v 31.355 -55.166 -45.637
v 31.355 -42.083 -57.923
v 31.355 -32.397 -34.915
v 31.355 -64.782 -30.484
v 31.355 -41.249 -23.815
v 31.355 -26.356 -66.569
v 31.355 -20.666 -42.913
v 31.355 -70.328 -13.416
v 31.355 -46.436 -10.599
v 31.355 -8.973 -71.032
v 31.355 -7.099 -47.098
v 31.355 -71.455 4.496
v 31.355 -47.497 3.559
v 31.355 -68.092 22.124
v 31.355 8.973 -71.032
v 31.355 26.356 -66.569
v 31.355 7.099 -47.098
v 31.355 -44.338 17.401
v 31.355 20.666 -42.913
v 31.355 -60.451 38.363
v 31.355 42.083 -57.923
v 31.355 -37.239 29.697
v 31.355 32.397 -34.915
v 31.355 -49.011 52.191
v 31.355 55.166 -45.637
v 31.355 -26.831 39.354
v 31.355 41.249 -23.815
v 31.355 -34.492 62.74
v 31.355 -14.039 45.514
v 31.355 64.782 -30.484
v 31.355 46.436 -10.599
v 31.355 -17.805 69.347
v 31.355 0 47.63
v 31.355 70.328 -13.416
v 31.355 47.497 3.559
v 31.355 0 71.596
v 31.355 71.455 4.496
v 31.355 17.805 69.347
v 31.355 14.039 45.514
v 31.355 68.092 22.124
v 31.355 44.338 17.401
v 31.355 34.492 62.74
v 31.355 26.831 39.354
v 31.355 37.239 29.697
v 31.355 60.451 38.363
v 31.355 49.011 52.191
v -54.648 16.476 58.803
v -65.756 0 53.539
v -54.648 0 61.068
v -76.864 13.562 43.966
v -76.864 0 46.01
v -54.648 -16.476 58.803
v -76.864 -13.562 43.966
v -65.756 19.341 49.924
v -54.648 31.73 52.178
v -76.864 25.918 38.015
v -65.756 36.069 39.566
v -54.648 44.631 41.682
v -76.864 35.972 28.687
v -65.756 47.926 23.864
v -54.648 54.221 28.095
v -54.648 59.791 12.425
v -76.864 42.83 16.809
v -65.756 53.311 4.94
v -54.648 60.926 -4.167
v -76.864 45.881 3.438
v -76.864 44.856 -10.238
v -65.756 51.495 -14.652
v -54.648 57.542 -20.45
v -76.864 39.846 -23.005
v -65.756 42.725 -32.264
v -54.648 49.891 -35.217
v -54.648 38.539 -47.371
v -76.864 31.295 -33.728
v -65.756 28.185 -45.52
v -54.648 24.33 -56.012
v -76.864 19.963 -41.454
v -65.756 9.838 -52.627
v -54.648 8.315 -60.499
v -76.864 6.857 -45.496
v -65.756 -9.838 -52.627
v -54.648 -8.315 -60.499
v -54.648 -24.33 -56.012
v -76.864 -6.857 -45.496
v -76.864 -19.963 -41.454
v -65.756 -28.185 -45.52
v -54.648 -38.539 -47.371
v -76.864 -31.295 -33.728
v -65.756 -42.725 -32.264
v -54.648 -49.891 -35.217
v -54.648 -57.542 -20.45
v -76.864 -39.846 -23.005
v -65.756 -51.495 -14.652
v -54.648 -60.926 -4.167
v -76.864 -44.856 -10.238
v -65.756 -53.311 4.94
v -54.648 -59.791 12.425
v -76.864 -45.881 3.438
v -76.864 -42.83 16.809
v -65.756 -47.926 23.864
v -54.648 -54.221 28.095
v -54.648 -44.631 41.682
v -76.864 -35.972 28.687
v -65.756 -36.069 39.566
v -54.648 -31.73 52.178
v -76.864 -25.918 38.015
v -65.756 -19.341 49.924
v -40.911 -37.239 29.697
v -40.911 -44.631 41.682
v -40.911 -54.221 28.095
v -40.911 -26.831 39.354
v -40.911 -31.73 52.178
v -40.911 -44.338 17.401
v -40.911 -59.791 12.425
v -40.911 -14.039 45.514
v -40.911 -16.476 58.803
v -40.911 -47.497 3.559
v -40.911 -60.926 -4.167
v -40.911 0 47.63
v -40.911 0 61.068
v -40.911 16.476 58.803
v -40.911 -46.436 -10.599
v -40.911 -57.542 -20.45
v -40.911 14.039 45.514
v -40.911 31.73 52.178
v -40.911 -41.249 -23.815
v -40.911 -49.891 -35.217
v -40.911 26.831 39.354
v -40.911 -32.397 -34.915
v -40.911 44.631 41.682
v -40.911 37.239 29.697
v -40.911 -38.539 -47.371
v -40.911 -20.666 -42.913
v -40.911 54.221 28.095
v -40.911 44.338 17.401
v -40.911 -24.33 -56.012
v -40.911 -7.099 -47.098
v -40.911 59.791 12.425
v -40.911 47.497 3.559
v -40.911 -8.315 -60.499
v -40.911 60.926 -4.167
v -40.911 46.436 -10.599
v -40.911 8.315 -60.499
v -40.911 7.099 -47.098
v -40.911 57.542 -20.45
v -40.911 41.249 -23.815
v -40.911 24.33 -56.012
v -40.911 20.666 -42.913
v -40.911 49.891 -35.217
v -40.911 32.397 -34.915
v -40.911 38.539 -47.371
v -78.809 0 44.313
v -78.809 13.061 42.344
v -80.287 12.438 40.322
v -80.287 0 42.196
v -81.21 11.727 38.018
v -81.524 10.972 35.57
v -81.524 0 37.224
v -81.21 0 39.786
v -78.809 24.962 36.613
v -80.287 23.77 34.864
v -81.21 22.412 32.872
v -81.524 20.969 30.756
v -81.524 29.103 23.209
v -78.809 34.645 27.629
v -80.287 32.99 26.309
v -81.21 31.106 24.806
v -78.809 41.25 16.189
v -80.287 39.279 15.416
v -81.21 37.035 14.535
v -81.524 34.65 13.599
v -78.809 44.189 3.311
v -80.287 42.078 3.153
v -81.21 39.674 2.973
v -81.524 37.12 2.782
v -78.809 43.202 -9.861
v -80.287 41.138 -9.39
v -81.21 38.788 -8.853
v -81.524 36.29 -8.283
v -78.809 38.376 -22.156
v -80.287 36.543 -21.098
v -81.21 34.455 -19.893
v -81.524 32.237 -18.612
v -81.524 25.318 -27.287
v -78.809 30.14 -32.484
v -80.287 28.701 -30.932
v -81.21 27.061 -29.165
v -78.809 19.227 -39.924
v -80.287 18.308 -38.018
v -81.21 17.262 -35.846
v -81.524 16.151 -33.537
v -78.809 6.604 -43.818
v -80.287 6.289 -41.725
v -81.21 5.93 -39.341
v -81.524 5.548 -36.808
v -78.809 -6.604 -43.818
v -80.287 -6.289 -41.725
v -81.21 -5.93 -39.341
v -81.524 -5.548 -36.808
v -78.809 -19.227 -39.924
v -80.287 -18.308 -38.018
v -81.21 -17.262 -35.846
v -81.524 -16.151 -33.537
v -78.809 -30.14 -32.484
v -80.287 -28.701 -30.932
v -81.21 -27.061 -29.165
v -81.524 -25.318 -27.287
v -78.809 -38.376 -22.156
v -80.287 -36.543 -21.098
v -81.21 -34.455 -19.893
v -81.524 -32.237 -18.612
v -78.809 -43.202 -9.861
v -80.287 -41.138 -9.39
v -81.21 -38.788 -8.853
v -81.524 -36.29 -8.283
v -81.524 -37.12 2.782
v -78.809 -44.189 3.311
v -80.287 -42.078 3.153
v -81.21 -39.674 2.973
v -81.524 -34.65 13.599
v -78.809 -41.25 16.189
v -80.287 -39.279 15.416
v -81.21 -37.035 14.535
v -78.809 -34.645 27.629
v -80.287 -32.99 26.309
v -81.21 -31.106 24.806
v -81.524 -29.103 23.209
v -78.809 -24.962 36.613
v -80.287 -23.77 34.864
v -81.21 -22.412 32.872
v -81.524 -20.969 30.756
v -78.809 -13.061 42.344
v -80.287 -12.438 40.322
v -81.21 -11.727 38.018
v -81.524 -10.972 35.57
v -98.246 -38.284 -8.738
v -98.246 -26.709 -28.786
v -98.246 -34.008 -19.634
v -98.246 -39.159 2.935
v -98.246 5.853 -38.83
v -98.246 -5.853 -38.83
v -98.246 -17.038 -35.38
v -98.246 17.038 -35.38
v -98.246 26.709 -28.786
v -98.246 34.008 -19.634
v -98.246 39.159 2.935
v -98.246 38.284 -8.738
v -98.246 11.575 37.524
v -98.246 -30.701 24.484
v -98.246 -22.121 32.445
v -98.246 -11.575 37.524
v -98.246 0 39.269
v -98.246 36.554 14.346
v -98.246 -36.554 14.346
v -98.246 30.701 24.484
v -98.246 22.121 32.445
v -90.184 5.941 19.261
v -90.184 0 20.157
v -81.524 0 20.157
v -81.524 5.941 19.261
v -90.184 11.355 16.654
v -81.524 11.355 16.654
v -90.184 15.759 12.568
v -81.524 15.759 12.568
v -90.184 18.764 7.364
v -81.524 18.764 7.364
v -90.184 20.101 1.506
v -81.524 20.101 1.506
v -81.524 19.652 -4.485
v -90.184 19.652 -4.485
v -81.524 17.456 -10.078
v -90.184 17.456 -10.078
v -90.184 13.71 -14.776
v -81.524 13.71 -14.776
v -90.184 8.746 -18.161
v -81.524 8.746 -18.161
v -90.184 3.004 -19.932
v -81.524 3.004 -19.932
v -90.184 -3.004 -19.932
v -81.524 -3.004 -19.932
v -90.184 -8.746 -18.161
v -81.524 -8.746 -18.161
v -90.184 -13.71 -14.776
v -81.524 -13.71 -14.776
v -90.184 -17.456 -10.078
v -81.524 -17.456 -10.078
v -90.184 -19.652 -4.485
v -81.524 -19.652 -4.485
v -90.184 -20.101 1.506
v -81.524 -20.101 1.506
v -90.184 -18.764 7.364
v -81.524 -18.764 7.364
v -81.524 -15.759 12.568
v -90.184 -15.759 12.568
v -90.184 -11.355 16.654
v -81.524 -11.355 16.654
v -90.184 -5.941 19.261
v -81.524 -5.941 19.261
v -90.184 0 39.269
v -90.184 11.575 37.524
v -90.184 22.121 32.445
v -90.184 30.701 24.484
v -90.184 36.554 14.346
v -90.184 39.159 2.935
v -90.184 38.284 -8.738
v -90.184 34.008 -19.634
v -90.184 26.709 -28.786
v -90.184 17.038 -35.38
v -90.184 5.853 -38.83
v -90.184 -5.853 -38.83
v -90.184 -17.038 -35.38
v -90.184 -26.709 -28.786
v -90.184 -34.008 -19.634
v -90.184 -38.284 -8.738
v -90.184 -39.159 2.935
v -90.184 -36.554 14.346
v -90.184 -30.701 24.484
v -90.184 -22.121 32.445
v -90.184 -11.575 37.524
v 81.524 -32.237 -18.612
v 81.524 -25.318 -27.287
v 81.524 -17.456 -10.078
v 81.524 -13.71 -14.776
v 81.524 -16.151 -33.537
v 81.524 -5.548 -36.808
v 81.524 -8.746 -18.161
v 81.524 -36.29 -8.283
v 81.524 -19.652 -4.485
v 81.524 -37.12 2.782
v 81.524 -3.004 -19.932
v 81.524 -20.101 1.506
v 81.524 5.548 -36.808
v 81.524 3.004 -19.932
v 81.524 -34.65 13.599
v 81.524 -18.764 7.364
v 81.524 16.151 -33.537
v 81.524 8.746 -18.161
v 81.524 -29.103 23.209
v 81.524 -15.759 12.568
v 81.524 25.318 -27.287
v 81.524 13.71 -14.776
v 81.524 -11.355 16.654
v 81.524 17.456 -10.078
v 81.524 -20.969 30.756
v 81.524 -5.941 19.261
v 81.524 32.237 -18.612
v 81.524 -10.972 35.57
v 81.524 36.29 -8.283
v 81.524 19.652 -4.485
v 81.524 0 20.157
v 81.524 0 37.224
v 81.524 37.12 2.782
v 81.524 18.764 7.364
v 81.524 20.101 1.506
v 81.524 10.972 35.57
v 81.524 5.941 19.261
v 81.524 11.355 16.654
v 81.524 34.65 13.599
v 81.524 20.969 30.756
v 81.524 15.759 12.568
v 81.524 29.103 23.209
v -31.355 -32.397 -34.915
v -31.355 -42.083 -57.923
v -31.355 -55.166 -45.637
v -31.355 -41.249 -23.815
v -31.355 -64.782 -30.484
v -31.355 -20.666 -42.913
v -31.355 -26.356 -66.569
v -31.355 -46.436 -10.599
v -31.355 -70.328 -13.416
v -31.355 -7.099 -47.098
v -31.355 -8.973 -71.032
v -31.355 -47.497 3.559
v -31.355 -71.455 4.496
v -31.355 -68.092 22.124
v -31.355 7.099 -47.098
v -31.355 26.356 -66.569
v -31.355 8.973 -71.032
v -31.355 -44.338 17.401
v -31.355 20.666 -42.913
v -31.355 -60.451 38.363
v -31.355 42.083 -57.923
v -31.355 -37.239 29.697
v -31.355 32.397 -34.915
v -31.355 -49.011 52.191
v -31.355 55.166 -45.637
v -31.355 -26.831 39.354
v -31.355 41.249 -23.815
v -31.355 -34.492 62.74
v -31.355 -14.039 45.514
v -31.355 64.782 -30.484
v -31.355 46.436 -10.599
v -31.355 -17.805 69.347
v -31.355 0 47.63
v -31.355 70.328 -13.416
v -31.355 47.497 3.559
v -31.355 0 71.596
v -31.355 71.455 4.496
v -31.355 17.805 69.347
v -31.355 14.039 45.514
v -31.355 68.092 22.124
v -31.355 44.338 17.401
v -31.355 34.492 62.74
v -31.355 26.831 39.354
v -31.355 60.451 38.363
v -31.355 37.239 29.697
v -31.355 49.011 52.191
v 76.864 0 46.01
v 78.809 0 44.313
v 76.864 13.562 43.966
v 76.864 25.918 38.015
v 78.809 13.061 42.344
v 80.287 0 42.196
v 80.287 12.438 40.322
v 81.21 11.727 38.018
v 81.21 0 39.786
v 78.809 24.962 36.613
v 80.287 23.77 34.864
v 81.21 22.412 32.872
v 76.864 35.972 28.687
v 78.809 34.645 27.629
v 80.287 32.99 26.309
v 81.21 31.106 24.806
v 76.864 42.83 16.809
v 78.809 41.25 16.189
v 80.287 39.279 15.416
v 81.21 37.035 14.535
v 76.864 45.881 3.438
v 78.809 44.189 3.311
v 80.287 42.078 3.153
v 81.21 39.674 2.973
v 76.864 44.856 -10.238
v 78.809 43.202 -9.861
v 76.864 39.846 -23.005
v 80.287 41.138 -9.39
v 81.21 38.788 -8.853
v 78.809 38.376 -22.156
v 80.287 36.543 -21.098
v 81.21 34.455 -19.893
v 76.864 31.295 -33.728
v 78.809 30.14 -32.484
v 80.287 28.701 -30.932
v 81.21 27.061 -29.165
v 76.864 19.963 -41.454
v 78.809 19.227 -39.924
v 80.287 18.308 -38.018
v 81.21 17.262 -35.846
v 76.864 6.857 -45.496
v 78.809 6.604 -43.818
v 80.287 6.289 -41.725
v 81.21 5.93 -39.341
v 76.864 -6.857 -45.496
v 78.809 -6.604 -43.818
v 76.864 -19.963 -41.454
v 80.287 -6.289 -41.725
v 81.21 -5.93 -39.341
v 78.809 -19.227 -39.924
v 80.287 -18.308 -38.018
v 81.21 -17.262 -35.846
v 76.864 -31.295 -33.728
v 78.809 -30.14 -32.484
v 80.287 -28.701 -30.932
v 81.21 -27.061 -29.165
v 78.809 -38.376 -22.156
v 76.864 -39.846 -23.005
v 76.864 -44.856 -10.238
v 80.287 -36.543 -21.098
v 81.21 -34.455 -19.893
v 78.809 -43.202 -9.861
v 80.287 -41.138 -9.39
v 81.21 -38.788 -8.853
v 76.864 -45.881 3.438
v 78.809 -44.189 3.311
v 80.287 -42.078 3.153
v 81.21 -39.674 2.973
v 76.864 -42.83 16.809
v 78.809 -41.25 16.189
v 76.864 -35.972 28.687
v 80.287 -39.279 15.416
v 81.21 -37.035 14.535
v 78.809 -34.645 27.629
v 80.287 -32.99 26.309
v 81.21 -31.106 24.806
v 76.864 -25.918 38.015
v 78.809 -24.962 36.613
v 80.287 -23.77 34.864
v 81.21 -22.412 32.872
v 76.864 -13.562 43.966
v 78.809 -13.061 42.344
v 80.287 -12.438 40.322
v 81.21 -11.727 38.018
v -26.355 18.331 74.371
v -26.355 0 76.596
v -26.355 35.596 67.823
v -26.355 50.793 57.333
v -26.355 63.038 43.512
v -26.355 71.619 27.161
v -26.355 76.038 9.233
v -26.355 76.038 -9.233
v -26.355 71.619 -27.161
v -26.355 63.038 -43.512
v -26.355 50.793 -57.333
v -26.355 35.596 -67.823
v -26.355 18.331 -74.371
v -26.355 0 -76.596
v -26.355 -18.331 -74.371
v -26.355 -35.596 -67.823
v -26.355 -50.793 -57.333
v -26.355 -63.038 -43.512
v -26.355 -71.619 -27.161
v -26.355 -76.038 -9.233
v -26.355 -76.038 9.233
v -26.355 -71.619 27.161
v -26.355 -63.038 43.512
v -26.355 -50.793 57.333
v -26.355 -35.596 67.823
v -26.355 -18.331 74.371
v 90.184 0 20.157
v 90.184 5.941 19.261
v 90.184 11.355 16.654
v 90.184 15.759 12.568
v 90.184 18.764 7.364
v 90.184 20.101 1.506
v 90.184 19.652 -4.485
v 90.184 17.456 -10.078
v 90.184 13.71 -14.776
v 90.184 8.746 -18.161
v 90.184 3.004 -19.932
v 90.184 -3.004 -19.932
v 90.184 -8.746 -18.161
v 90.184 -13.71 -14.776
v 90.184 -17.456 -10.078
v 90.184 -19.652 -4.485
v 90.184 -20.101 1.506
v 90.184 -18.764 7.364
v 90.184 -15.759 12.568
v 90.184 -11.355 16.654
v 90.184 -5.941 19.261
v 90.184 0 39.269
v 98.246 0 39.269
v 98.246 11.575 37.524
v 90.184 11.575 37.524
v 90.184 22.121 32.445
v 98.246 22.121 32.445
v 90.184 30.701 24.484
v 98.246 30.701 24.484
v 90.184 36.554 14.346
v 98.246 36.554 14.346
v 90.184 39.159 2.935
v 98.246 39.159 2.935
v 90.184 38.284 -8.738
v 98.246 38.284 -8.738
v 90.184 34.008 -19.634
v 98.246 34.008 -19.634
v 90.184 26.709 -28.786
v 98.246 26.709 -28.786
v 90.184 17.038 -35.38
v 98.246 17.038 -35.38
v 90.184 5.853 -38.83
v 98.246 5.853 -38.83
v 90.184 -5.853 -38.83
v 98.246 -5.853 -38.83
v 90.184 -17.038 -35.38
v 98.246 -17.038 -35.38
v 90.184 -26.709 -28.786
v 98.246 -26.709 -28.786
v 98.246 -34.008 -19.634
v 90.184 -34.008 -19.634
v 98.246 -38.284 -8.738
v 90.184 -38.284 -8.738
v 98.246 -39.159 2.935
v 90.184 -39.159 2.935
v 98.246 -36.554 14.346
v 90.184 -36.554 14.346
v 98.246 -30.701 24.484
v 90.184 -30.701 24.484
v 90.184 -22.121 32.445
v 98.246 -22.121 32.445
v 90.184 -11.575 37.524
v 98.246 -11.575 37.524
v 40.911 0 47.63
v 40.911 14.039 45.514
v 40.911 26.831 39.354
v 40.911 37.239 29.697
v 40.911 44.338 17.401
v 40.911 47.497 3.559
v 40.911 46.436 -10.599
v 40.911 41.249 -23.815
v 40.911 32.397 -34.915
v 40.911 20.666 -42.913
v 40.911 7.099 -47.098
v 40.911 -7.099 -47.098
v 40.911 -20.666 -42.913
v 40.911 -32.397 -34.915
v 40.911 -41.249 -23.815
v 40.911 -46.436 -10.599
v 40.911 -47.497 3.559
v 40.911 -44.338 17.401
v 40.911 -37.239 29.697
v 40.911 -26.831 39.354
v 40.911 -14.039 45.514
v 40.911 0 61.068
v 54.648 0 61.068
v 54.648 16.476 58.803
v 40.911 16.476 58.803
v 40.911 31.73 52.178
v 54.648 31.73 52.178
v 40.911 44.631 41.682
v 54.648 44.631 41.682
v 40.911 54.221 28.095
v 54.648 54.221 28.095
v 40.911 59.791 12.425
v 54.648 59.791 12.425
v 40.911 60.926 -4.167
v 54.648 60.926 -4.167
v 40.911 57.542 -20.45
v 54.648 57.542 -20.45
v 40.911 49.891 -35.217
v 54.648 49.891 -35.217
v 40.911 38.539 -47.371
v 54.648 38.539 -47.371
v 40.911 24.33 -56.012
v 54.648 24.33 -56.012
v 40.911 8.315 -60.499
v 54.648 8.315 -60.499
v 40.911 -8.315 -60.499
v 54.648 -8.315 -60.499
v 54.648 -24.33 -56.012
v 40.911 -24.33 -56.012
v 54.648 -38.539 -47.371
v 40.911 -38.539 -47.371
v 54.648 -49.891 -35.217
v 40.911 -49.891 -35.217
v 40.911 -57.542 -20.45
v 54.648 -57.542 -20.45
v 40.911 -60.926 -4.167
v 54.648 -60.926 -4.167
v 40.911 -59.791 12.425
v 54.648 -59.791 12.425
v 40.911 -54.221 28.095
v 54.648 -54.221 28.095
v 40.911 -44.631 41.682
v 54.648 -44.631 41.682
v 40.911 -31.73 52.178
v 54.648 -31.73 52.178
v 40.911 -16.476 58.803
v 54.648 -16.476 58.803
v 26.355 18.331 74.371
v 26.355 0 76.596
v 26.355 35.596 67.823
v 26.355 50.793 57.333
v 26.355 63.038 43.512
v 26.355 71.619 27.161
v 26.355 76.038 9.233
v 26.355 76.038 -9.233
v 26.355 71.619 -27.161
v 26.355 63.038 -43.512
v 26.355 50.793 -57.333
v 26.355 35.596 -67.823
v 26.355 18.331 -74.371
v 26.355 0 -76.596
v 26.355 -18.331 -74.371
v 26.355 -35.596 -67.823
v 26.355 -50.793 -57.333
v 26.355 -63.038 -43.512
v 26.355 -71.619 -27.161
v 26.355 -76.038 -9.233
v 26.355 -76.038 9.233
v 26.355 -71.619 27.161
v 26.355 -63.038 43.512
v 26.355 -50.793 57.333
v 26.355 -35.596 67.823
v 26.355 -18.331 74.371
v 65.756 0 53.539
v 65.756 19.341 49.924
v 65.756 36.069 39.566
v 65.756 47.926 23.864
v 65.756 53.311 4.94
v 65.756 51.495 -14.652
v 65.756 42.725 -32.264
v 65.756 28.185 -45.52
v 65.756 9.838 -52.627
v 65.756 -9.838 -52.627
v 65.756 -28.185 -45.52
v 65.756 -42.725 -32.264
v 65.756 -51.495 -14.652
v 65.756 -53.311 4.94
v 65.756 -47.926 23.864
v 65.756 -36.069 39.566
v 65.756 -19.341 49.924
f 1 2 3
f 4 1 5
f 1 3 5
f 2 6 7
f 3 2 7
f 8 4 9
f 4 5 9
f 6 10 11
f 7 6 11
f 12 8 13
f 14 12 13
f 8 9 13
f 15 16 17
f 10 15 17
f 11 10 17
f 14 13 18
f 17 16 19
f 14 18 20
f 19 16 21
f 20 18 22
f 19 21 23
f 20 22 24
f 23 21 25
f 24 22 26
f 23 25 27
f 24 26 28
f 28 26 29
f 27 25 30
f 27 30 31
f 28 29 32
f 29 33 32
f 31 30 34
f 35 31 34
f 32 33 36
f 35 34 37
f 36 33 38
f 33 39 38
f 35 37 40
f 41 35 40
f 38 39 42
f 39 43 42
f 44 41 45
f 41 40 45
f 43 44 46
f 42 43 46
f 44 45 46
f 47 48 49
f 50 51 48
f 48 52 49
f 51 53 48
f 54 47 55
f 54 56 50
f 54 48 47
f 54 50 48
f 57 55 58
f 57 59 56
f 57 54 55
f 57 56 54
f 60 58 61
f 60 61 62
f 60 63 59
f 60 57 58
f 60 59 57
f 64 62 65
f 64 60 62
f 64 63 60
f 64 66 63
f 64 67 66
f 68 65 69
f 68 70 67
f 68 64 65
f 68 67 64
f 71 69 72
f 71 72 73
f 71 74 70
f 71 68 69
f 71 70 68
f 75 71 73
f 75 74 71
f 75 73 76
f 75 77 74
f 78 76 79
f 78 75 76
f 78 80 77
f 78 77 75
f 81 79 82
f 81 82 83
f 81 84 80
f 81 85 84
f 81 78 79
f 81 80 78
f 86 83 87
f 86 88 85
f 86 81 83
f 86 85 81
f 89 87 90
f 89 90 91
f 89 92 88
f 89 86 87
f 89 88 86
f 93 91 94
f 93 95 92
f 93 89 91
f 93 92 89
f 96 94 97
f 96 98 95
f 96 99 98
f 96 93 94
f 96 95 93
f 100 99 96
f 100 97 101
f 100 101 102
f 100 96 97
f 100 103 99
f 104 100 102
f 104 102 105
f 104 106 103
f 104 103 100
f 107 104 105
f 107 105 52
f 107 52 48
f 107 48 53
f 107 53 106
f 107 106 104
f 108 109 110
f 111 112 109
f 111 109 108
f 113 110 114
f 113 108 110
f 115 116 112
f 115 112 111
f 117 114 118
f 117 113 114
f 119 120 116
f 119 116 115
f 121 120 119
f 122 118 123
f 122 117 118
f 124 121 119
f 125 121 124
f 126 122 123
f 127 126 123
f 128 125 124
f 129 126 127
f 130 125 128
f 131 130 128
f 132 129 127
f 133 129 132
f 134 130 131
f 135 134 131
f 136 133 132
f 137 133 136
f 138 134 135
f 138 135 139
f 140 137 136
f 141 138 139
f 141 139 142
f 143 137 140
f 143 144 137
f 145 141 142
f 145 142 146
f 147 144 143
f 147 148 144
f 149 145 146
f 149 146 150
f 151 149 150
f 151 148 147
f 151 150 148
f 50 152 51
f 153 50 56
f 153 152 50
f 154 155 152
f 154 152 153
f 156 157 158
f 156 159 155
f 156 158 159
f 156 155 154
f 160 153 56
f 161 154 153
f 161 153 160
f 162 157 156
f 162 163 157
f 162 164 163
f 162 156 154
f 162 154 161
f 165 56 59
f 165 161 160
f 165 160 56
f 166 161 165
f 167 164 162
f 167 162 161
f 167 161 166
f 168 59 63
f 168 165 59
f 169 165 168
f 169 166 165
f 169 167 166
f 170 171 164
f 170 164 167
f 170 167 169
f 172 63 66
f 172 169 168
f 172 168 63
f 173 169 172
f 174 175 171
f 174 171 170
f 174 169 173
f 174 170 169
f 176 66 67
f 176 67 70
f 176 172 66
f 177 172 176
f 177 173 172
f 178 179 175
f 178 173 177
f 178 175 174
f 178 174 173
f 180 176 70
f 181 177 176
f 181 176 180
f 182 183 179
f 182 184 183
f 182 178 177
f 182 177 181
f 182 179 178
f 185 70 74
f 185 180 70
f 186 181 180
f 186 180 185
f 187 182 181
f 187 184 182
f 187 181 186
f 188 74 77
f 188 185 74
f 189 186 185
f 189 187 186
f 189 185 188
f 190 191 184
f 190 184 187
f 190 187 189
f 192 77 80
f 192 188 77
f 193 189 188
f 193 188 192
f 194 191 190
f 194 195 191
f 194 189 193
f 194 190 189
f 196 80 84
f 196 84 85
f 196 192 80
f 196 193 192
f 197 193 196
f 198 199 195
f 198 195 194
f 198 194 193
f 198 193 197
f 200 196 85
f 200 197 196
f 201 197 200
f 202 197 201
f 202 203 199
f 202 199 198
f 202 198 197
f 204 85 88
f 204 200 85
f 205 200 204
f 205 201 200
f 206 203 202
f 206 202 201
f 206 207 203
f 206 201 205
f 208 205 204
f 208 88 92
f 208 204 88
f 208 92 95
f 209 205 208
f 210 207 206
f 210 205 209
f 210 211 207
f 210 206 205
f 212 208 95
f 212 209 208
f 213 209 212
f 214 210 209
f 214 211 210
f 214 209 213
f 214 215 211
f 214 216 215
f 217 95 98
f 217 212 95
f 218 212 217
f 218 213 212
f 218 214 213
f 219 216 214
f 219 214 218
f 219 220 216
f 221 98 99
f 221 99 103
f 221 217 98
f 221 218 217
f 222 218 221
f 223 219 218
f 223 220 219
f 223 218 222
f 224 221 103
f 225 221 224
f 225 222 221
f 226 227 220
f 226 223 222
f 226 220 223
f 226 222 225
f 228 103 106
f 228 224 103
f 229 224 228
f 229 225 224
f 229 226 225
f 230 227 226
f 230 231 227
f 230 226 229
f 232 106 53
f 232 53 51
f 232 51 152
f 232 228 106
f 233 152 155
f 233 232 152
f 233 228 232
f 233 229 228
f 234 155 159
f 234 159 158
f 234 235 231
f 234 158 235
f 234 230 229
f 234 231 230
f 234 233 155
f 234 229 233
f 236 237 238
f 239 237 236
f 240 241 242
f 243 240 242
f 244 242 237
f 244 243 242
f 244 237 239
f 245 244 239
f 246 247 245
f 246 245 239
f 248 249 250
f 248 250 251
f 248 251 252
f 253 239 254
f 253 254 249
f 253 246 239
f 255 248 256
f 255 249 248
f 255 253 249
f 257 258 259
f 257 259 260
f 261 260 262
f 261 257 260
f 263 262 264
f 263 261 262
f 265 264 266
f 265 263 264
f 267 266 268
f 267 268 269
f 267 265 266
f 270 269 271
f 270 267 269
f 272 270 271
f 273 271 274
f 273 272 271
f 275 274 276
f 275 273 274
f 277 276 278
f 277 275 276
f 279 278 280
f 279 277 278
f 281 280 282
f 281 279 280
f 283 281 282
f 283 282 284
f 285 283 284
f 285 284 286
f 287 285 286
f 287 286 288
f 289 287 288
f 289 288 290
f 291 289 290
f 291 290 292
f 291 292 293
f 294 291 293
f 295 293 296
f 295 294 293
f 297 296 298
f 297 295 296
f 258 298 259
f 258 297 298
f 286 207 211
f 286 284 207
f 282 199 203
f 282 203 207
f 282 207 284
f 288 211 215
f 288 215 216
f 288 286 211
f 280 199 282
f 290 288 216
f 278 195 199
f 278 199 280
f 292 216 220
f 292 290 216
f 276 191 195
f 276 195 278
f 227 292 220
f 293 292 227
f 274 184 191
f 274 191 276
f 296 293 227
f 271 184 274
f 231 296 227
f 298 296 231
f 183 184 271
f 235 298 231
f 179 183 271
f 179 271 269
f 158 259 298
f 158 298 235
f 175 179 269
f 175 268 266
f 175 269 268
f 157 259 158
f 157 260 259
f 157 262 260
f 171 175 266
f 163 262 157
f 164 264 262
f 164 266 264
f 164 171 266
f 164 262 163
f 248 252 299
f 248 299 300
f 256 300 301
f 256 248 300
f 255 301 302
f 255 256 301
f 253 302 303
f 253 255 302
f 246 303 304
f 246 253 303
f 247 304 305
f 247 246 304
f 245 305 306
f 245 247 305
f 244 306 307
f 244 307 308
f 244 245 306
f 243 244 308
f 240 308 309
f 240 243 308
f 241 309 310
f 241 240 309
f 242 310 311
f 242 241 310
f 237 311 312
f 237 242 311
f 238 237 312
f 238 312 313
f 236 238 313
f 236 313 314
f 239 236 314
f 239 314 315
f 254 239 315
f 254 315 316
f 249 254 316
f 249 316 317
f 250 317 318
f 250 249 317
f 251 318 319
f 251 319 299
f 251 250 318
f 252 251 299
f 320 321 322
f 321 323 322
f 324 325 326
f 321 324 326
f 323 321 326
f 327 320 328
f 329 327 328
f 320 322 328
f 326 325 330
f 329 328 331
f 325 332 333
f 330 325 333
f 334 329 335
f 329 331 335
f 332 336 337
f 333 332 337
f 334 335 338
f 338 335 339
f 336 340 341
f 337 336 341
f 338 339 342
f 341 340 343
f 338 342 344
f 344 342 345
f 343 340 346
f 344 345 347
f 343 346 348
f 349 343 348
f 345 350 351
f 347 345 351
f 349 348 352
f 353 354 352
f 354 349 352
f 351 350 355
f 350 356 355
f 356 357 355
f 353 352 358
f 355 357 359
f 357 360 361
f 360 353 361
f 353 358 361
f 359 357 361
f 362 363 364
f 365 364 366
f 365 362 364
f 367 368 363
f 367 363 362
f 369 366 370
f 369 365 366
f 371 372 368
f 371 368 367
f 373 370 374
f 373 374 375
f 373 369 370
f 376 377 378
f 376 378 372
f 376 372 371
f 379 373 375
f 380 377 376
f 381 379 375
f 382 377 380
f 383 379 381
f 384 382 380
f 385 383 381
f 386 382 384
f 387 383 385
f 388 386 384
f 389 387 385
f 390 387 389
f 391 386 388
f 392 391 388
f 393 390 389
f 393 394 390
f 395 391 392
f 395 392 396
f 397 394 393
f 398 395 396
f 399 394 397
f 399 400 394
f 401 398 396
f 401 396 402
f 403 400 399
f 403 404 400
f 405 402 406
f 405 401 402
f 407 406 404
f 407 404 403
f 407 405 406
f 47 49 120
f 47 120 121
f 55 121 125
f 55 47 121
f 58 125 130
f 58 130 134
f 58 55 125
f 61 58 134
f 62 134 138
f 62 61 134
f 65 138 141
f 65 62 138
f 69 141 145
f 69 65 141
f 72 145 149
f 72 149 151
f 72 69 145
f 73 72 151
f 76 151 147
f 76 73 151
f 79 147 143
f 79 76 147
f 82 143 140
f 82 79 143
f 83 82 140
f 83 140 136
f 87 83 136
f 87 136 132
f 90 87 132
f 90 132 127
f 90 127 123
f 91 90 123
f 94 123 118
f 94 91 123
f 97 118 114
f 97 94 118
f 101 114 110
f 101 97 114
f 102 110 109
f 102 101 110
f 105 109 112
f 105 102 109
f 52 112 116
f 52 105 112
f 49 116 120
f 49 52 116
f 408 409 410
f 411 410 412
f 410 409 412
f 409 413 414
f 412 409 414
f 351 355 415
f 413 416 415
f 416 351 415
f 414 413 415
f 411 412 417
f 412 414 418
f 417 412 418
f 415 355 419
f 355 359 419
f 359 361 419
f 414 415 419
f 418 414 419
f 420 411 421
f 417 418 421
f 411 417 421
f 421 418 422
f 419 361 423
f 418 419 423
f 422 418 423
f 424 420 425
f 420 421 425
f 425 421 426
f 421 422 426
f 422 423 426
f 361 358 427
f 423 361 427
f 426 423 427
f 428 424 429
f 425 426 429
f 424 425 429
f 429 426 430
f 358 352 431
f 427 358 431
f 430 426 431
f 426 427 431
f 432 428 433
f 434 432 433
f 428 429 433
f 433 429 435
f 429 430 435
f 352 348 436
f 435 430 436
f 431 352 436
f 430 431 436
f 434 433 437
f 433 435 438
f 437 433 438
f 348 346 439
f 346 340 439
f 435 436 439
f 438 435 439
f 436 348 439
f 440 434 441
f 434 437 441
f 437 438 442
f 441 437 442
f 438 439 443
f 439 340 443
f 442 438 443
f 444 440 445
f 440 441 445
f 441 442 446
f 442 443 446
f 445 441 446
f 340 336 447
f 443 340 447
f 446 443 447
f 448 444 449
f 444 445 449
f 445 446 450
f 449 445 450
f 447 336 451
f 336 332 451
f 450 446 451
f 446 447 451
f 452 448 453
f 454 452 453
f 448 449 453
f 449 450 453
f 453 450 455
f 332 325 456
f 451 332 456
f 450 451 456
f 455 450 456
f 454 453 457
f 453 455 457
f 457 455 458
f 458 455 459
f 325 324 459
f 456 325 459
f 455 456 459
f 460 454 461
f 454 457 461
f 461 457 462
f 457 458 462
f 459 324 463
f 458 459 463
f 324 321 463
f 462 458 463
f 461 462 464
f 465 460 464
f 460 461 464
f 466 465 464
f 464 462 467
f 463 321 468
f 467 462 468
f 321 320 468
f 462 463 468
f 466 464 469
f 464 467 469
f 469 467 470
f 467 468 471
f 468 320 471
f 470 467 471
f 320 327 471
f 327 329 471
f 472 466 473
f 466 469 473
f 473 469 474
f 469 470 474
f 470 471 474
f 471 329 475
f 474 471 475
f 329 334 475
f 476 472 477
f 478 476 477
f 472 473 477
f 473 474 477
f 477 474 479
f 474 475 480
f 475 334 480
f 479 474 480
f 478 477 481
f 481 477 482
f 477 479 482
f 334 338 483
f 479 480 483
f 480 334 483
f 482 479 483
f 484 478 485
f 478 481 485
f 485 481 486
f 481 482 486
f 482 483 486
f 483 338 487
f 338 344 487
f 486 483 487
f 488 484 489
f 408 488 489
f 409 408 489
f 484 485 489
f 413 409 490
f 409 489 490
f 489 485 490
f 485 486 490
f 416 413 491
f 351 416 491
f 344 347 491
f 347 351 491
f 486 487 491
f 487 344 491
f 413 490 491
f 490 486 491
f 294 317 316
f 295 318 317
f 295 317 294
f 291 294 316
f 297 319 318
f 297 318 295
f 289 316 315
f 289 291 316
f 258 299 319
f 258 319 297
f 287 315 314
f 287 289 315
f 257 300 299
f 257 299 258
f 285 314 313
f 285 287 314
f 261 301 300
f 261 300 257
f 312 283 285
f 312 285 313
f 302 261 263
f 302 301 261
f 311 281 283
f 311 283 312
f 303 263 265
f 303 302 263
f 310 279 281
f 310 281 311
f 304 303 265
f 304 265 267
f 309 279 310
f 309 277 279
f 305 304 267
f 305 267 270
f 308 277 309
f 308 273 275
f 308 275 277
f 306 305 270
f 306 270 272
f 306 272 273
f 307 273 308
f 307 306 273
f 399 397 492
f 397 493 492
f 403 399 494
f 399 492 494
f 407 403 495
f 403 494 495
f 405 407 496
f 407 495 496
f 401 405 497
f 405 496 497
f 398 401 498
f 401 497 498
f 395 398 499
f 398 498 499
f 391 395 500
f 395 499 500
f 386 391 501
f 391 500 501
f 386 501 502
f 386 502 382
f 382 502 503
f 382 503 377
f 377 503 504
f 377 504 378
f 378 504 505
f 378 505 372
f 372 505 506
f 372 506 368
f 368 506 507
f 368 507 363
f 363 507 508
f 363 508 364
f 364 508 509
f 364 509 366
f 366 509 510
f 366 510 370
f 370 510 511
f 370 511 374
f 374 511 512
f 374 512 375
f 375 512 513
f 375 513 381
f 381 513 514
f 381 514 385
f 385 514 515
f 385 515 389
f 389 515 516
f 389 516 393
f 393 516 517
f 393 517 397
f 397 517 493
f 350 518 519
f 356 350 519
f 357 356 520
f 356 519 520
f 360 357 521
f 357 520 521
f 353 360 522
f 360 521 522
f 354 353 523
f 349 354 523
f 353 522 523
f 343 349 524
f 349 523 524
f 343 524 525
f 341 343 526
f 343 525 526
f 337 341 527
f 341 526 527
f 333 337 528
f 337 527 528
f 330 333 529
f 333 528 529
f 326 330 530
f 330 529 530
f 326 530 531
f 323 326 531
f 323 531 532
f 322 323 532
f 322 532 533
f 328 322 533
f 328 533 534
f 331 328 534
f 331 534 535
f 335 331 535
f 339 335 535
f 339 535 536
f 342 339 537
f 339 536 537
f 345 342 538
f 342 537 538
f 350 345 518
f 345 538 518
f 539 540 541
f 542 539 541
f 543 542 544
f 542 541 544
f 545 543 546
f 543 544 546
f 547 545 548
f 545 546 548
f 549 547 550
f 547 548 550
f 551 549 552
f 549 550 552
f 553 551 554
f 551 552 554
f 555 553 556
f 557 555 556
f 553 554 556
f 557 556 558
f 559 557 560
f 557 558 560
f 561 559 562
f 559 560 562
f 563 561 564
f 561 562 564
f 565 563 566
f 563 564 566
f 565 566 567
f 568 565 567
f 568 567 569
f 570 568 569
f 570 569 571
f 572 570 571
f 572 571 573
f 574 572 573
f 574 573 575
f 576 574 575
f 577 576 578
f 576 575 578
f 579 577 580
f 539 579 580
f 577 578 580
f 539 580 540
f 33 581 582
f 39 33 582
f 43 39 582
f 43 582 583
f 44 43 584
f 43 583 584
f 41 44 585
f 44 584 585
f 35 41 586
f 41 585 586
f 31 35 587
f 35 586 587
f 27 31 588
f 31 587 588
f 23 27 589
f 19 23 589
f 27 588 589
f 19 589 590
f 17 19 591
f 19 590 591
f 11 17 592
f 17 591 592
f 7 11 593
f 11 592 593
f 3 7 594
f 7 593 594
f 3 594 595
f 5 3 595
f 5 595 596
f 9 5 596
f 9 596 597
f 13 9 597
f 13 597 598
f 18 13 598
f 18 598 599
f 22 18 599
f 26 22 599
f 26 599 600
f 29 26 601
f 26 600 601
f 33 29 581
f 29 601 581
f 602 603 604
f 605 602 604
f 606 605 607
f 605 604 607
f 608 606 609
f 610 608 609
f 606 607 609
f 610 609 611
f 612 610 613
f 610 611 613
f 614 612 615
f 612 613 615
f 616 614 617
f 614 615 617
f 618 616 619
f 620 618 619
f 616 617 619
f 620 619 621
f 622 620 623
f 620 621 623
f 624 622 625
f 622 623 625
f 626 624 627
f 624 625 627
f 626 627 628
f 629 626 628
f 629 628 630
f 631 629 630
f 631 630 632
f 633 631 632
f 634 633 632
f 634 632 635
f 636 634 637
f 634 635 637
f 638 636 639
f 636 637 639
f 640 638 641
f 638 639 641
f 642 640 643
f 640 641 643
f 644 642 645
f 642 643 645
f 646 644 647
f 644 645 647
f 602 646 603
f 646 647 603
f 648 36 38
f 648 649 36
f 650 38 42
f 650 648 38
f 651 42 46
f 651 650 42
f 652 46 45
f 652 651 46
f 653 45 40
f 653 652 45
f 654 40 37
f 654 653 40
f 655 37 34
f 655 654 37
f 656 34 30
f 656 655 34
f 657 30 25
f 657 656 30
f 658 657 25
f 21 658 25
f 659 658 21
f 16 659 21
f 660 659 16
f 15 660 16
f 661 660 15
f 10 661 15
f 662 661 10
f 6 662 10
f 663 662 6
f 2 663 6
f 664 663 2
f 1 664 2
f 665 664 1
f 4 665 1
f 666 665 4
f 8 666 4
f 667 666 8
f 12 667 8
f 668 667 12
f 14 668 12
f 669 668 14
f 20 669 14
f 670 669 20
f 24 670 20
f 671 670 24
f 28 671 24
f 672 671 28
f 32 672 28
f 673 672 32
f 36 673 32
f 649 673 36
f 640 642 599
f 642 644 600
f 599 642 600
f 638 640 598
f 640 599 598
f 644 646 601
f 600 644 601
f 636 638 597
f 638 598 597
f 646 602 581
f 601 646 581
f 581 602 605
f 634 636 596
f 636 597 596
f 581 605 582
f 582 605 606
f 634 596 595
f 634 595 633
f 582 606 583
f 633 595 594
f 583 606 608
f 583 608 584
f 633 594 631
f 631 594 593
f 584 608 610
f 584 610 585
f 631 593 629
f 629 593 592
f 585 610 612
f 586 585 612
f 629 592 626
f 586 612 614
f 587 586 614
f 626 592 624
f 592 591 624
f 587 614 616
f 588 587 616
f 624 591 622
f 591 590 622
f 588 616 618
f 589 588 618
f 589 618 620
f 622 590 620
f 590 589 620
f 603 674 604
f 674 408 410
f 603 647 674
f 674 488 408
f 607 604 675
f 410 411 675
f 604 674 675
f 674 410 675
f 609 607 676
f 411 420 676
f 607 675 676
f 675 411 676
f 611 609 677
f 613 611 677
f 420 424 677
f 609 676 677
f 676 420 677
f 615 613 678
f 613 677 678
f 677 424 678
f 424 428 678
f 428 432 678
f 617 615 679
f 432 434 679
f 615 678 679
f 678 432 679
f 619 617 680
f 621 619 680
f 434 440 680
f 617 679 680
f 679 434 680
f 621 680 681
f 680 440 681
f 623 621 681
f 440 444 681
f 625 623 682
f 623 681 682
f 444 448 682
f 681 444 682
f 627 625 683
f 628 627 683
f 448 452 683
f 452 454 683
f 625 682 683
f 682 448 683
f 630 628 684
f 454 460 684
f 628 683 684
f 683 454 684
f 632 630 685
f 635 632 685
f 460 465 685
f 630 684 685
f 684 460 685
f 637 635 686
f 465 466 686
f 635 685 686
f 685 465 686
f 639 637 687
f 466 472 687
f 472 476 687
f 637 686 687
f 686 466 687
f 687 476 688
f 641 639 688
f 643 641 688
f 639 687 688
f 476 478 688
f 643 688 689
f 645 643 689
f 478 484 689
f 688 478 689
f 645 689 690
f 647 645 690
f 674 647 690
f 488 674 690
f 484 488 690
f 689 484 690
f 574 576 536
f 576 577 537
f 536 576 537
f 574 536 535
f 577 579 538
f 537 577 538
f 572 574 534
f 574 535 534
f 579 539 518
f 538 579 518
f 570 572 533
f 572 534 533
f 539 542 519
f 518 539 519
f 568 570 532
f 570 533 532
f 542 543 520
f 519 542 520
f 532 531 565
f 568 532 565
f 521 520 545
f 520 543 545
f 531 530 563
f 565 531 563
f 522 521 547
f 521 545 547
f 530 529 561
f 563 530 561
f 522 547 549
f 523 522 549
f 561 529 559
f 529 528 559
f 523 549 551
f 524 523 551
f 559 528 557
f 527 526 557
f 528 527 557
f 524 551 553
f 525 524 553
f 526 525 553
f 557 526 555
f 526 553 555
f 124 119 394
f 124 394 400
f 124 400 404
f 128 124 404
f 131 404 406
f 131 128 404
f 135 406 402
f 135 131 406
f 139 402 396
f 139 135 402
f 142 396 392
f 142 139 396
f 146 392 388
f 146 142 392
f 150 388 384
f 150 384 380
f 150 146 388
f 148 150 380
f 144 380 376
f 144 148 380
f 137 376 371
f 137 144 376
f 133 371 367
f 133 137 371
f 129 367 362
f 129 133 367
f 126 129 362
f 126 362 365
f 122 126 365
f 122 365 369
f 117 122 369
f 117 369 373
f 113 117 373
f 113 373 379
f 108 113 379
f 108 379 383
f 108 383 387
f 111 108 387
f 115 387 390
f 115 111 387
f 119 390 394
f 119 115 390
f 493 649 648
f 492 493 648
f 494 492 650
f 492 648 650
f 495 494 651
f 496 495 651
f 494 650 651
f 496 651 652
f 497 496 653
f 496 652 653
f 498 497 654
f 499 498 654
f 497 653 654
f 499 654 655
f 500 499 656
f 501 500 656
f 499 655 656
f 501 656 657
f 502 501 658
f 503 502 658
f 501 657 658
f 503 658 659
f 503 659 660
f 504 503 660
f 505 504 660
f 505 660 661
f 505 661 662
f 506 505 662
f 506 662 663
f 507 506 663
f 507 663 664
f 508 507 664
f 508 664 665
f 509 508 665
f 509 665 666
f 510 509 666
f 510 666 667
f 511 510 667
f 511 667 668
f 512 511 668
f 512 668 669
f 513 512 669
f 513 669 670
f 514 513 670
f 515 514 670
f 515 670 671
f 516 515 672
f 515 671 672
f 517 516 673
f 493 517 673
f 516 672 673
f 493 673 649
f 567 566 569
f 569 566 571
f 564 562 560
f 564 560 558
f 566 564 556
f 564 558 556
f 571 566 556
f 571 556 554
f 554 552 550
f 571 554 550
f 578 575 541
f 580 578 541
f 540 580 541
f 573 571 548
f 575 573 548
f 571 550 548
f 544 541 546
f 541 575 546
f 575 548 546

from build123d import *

# Parameters (mm, degrees)
F2_R    = 10.614455
F3_SIZE = 5


with BuildPart() as f1:
    # F0 (on Front) → F1 (revolve)
    with BuildSketch(Plane.XZ):
        Polygon((-98.246373, 0), (0, 0), (0, 76.596335), (-31.355228, 76.596335), (-31.355228, 47.630079), (-40.911108, 47.630079), (-40.911108, 61.068039), (-54.647684, 61.068039), (-81.52359, 42.852145), (-81.52359, 20.156933), (-90.183608, 20.156933), (-90.183608, 39.268687), (-98.246373, 39.268687), align=None)
    revolve(axis=Axis((-49.123187, 0, 0), (-1, 0, 0)))

    # F2
    f2_edges = [f1.edges().sort_by_distance(p)[0] for p in [
        (-81.52359, 0, -42.852145),
    ]]
    fillet(f2_edges, radius=F2_R)

    # F3
    f3_edges = [f1.edges().sort_by_distance(p)[0] for p in [
        (-31.355228, 0, -76.596335),
    ]]
    chamfer(f3_edges, length=F3_SIZE)

    # F4: F1 across face


with BuildPart() as f1_1:
    add(f1.part)
    add(f1.part.mirror(Plane.YZ))

    # F5: F1 across plane


with BuildPart() as f1_2:
    add(f1_1.part)
    add(f1_1.part.mirror(Plane.YZ))


solid = f1_2.part
